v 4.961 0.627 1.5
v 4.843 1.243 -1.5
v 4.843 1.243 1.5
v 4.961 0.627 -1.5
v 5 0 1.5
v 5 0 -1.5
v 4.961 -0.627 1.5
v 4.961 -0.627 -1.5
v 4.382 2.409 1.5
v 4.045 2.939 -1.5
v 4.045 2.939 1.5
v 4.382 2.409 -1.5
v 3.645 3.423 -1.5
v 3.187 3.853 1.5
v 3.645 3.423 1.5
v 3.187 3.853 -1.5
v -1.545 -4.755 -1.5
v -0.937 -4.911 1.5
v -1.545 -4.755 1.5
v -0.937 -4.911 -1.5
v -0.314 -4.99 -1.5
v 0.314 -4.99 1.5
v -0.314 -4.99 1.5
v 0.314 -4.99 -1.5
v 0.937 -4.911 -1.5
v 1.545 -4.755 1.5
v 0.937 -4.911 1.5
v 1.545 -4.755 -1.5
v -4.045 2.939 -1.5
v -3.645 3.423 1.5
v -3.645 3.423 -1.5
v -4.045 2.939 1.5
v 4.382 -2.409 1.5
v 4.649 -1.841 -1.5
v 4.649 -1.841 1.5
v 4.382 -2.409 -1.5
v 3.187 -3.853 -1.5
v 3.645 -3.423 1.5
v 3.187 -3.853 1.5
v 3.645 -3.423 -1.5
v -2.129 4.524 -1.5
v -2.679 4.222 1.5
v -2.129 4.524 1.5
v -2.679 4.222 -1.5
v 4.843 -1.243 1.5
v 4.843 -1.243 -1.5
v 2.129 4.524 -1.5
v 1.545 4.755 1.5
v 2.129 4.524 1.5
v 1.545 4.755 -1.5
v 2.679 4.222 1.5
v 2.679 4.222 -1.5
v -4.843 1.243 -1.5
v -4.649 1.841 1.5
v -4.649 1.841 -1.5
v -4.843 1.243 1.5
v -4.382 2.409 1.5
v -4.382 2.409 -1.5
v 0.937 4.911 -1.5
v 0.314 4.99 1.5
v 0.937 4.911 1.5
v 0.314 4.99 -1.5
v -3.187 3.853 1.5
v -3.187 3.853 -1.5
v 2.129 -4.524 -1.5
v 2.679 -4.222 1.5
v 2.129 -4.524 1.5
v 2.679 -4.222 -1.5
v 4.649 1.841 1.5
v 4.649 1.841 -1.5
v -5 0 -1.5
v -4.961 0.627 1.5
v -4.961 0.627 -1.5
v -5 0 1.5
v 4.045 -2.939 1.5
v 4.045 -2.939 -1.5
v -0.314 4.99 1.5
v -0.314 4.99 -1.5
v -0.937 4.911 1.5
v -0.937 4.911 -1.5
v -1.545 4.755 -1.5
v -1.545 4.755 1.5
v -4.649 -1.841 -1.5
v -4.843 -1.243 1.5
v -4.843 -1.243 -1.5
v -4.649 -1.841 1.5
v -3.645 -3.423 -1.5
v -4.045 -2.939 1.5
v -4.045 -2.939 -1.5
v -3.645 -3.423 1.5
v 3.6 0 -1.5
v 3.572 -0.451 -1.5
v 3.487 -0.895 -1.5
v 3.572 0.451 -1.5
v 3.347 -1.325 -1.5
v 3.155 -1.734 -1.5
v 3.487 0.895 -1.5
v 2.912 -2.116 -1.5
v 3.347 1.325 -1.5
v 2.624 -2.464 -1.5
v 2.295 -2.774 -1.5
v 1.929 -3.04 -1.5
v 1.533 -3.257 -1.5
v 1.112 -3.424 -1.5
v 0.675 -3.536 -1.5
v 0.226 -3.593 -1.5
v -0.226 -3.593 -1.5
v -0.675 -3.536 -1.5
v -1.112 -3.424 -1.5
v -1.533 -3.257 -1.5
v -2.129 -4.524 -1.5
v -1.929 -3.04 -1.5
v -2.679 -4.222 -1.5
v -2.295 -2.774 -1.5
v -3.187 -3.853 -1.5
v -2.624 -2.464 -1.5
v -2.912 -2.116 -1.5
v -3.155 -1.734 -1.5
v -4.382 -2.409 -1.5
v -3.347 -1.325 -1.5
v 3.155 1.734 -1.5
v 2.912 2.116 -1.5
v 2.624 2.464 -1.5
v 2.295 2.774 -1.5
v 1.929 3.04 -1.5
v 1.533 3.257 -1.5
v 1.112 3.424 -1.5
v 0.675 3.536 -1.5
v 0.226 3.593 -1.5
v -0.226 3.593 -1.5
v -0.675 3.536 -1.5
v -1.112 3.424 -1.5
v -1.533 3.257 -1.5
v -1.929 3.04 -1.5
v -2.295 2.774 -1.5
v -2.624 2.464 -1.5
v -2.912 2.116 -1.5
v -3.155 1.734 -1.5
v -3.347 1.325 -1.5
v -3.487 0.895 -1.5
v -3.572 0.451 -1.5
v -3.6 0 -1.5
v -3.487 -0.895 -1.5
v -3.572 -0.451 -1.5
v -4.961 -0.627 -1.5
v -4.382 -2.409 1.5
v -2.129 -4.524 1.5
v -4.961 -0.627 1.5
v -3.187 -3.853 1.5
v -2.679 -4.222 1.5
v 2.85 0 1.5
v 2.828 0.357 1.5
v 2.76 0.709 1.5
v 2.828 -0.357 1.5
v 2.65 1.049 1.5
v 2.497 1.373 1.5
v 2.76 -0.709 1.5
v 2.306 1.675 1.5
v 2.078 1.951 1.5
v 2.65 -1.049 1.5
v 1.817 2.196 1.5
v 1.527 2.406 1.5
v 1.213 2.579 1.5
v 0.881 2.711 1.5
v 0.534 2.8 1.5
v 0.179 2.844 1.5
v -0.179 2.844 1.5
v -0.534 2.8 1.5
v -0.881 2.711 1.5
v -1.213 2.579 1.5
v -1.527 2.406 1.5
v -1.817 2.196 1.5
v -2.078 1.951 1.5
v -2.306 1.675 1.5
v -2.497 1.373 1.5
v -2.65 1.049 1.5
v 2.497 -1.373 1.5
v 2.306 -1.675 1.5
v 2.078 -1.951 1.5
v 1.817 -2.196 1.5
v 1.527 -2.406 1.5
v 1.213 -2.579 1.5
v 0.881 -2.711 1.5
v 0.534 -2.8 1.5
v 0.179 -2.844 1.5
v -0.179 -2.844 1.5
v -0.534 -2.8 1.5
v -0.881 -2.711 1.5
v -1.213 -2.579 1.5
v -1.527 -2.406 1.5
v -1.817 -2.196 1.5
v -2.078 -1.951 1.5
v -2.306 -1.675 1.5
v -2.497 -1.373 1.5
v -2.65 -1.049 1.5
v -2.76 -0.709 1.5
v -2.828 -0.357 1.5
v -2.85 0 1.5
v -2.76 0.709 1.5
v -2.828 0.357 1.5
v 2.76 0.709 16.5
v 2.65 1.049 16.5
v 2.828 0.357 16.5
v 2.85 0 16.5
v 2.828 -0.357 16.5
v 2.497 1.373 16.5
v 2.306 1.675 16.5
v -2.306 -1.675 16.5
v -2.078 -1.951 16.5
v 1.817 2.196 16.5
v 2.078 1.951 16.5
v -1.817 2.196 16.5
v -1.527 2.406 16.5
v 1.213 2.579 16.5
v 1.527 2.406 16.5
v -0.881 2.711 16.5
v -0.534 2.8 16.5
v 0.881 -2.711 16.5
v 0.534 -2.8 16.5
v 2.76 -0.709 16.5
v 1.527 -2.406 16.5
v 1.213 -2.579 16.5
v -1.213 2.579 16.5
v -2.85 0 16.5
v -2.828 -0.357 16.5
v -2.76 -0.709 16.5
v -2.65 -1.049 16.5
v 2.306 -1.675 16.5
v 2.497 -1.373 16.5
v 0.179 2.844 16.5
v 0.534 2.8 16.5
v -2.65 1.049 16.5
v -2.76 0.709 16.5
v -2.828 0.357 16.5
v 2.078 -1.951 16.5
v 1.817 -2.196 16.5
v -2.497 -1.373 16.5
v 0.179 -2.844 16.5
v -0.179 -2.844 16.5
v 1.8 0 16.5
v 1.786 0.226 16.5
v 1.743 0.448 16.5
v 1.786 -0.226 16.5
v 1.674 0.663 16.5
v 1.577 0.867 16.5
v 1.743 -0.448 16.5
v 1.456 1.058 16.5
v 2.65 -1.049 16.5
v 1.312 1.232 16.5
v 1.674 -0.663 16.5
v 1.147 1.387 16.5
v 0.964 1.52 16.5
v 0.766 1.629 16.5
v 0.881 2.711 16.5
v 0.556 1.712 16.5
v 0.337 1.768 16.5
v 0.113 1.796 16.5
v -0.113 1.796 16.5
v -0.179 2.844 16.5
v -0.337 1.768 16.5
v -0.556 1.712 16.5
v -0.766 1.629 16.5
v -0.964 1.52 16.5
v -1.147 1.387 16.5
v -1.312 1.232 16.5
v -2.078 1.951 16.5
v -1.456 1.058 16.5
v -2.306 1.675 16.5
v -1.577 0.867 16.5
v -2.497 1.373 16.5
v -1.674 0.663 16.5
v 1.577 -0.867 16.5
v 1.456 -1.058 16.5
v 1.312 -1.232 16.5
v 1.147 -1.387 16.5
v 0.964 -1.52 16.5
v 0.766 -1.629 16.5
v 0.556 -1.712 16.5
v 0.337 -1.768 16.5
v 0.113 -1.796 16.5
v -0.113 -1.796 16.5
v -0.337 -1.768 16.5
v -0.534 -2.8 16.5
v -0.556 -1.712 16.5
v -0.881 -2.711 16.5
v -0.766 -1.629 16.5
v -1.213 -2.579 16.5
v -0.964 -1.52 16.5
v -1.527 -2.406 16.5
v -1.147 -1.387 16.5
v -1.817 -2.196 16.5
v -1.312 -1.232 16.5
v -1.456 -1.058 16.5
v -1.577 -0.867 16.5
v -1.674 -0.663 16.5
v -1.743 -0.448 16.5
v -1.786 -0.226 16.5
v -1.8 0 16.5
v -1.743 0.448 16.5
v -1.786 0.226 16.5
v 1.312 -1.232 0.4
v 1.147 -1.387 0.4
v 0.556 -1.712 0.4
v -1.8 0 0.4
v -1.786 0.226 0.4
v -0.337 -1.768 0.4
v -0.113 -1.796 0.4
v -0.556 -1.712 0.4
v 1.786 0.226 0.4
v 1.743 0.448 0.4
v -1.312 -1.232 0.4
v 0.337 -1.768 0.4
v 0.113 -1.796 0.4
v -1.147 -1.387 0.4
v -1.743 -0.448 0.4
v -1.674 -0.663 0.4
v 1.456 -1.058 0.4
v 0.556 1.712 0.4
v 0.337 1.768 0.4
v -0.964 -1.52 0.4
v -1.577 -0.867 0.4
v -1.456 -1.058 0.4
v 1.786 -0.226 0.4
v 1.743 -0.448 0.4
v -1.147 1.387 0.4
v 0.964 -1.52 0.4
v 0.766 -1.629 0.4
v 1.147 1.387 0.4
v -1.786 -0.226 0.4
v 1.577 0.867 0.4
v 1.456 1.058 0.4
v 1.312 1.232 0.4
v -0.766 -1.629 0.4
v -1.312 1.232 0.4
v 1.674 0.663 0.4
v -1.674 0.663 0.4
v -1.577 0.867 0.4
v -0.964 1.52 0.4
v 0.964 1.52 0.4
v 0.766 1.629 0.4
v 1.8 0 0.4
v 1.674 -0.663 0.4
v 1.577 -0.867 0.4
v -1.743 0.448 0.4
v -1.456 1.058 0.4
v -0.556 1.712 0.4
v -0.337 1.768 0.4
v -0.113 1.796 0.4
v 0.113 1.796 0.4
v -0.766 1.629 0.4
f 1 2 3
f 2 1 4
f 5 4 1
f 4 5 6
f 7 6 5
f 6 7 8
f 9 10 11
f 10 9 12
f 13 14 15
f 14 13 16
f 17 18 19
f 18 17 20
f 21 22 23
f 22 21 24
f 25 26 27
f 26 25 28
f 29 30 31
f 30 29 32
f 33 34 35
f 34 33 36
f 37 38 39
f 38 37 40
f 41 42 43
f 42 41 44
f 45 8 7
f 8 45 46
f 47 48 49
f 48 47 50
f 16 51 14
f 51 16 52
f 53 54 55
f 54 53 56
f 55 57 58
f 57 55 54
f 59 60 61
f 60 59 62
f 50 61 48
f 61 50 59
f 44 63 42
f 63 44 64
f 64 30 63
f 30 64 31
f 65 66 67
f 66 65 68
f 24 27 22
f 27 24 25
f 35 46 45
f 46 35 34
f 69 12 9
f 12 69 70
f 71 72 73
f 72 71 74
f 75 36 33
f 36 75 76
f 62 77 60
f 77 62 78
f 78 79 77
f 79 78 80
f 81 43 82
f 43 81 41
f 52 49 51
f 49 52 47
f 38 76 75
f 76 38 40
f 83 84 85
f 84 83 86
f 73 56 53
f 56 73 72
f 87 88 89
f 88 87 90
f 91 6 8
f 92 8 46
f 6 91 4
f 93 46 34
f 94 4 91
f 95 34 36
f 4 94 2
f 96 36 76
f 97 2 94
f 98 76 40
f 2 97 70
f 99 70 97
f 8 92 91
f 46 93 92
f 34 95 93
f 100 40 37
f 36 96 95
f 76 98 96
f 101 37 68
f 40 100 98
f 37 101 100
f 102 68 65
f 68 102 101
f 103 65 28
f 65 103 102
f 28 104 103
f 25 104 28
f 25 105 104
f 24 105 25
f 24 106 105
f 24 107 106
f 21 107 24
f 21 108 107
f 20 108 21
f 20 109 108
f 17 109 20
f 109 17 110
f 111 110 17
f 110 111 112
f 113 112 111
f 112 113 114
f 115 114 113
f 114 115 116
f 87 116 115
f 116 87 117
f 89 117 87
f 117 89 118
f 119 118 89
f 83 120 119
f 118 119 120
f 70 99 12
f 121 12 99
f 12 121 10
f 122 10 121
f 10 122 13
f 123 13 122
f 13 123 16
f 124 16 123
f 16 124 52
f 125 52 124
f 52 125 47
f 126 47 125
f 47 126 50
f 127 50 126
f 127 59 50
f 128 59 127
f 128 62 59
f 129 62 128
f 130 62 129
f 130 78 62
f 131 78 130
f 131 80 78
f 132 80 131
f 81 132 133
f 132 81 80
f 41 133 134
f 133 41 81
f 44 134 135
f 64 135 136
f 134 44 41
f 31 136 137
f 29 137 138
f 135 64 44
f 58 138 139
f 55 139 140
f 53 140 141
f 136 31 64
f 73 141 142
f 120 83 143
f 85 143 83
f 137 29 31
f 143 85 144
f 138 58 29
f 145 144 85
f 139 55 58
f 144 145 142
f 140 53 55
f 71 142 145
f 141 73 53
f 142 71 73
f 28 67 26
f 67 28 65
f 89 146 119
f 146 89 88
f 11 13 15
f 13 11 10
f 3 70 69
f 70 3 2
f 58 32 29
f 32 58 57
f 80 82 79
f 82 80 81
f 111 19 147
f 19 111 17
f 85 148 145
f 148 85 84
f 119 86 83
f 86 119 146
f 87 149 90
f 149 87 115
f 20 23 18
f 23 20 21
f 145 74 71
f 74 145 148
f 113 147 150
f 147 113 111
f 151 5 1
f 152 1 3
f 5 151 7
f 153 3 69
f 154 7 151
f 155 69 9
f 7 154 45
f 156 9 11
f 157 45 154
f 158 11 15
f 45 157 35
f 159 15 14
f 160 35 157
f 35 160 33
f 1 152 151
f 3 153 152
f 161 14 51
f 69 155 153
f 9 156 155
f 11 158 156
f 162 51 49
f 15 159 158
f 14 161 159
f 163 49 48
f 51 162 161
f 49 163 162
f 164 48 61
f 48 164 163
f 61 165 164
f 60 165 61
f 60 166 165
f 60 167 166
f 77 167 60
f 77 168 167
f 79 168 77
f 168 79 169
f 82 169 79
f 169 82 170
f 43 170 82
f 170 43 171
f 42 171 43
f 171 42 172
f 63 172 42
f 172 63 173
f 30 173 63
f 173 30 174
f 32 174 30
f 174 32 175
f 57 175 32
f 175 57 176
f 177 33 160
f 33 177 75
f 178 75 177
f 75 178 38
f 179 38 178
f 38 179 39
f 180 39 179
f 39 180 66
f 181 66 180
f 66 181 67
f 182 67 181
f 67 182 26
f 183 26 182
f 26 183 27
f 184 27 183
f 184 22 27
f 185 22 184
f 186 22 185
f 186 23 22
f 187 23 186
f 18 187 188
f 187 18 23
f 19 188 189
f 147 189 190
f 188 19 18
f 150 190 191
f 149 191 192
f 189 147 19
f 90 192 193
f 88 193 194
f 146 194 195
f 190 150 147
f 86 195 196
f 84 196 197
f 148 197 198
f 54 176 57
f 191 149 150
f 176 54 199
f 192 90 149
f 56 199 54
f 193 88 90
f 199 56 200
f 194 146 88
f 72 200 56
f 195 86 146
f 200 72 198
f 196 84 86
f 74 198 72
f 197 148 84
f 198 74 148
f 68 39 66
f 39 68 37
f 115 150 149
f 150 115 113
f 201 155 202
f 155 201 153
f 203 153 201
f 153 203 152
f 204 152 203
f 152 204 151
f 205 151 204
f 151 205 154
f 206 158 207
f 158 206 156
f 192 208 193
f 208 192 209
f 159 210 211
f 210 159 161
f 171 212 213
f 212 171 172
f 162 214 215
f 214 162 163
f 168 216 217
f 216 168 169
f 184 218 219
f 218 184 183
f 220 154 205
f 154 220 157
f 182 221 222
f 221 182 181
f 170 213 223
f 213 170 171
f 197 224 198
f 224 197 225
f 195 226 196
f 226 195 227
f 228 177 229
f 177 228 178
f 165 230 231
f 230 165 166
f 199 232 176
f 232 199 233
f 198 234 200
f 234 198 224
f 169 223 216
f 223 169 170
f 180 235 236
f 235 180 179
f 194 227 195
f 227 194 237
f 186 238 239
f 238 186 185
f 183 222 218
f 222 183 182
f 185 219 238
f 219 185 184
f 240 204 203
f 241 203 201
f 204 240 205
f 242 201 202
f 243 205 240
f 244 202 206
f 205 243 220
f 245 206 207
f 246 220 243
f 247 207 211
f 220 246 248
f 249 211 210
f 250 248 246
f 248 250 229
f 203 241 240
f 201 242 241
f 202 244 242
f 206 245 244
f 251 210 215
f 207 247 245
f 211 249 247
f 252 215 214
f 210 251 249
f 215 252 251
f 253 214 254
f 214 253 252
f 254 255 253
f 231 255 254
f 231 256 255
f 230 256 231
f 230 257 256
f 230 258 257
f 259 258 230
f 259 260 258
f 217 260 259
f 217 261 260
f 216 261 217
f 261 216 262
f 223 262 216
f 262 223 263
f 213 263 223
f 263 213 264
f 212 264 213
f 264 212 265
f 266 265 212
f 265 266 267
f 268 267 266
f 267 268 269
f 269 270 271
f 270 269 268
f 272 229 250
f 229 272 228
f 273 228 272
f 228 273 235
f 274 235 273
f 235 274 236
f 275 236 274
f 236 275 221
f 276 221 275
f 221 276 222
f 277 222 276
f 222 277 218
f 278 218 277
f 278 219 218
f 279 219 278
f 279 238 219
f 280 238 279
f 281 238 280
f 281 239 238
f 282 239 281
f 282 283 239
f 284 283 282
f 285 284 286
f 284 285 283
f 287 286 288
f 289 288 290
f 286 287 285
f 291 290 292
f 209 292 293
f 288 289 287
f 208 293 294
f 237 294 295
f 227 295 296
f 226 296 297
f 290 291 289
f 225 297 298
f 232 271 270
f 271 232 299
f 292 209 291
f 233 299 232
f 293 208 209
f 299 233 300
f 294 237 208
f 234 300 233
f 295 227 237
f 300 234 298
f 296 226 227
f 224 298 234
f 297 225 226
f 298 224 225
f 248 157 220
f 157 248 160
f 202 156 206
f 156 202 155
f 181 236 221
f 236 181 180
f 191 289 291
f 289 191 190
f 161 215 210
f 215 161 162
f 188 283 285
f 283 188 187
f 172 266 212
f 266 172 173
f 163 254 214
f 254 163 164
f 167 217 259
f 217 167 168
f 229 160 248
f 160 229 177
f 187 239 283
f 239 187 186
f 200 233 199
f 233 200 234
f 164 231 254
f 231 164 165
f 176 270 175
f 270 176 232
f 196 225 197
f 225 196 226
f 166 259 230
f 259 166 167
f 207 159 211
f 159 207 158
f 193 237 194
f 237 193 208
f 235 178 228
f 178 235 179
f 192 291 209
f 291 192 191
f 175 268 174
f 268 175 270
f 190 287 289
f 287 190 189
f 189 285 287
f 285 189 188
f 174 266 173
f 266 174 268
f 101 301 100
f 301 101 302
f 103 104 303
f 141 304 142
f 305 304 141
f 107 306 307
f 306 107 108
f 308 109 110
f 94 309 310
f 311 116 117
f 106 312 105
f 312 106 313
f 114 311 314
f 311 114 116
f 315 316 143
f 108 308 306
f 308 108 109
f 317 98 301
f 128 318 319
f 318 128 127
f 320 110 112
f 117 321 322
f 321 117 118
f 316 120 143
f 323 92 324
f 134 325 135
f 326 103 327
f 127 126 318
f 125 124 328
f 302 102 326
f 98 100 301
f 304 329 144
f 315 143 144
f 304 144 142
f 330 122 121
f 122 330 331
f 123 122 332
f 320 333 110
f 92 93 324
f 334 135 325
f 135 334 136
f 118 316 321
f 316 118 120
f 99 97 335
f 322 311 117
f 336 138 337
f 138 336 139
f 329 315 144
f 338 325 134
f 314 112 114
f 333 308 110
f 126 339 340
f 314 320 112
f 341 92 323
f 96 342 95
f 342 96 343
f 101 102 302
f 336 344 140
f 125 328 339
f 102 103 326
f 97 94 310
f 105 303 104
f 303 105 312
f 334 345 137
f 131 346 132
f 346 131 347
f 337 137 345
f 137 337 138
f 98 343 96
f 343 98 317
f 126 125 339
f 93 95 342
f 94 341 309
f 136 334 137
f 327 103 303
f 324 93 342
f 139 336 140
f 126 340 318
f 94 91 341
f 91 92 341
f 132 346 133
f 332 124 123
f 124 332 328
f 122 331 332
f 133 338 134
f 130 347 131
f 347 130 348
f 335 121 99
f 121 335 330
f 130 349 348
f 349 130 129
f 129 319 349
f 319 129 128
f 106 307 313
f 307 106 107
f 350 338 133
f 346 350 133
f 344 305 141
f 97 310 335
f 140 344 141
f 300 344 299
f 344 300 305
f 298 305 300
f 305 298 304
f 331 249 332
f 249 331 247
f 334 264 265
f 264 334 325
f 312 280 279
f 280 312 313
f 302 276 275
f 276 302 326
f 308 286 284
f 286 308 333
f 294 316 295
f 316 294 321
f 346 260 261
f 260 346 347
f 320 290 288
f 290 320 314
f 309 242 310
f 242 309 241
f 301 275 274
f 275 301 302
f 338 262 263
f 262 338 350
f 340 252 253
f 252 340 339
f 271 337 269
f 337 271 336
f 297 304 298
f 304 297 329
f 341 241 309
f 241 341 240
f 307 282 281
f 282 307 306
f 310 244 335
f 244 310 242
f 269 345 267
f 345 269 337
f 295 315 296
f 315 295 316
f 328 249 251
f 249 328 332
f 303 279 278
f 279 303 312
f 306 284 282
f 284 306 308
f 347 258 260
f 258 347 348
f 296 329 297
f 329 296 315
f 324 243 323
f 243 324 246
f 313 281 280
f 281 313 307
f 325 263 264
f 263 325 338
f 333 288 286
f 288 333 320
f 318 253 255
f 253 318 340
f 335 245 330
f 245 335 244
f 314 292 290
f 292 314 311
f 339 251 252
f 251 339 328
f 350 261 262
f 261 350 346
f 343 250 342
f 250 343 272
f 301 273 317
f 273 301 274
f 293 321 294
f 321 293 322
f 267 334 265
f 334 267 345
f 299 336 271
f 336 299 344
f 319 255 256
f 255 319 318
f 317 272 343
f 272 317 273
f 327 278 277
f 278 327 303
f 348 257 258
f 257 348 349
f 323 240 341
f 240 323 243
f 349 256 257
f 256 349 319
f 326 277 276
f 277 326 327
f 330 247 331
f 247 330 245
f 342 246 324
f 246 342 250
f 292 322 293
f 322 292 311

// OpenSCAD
$fn = 50;


difference() {
	union() {
		translate(v = [0, 0, -1.5000000000]) {
			cylinder(h = 3, r = 5.0000000000);
		}
		translate(v = [0, 0, -1.5000000000]) {
			cylinder(h = 18, r = 2.8500000000);
		}
	}
	union() {
		translate(v = [0, 0, -1.5000000000]) {
			rotate(a = [0, 180, 0]) {
				difference() {
					union() {
						translate(v = [0, 0, -18.0000000000]) {
							cylinder(h = 18, r = 1.5000000000);
						}
						translate(v = [0, 0, -1.9000000000]) {
							cylinder(h = 1.9000000000, r1 = 1.8000000000, r2 = 3.6000000000);
						}
						translate(v = [0, 0, -18.0000000000]) {
							cylinder(h = 18, r = 1.8000000000);
						}
						translate(v = [0, 0, -18.0000000000]) {
							cylinder(h = 18, r = 1.5000000000);
						}
					}
					union();
				}
			}
		}
		translate(v = [0, 0, -100.0000000000]) {
			cylinder(h = 200, r = 1.8000000000);
		}
	}
}
